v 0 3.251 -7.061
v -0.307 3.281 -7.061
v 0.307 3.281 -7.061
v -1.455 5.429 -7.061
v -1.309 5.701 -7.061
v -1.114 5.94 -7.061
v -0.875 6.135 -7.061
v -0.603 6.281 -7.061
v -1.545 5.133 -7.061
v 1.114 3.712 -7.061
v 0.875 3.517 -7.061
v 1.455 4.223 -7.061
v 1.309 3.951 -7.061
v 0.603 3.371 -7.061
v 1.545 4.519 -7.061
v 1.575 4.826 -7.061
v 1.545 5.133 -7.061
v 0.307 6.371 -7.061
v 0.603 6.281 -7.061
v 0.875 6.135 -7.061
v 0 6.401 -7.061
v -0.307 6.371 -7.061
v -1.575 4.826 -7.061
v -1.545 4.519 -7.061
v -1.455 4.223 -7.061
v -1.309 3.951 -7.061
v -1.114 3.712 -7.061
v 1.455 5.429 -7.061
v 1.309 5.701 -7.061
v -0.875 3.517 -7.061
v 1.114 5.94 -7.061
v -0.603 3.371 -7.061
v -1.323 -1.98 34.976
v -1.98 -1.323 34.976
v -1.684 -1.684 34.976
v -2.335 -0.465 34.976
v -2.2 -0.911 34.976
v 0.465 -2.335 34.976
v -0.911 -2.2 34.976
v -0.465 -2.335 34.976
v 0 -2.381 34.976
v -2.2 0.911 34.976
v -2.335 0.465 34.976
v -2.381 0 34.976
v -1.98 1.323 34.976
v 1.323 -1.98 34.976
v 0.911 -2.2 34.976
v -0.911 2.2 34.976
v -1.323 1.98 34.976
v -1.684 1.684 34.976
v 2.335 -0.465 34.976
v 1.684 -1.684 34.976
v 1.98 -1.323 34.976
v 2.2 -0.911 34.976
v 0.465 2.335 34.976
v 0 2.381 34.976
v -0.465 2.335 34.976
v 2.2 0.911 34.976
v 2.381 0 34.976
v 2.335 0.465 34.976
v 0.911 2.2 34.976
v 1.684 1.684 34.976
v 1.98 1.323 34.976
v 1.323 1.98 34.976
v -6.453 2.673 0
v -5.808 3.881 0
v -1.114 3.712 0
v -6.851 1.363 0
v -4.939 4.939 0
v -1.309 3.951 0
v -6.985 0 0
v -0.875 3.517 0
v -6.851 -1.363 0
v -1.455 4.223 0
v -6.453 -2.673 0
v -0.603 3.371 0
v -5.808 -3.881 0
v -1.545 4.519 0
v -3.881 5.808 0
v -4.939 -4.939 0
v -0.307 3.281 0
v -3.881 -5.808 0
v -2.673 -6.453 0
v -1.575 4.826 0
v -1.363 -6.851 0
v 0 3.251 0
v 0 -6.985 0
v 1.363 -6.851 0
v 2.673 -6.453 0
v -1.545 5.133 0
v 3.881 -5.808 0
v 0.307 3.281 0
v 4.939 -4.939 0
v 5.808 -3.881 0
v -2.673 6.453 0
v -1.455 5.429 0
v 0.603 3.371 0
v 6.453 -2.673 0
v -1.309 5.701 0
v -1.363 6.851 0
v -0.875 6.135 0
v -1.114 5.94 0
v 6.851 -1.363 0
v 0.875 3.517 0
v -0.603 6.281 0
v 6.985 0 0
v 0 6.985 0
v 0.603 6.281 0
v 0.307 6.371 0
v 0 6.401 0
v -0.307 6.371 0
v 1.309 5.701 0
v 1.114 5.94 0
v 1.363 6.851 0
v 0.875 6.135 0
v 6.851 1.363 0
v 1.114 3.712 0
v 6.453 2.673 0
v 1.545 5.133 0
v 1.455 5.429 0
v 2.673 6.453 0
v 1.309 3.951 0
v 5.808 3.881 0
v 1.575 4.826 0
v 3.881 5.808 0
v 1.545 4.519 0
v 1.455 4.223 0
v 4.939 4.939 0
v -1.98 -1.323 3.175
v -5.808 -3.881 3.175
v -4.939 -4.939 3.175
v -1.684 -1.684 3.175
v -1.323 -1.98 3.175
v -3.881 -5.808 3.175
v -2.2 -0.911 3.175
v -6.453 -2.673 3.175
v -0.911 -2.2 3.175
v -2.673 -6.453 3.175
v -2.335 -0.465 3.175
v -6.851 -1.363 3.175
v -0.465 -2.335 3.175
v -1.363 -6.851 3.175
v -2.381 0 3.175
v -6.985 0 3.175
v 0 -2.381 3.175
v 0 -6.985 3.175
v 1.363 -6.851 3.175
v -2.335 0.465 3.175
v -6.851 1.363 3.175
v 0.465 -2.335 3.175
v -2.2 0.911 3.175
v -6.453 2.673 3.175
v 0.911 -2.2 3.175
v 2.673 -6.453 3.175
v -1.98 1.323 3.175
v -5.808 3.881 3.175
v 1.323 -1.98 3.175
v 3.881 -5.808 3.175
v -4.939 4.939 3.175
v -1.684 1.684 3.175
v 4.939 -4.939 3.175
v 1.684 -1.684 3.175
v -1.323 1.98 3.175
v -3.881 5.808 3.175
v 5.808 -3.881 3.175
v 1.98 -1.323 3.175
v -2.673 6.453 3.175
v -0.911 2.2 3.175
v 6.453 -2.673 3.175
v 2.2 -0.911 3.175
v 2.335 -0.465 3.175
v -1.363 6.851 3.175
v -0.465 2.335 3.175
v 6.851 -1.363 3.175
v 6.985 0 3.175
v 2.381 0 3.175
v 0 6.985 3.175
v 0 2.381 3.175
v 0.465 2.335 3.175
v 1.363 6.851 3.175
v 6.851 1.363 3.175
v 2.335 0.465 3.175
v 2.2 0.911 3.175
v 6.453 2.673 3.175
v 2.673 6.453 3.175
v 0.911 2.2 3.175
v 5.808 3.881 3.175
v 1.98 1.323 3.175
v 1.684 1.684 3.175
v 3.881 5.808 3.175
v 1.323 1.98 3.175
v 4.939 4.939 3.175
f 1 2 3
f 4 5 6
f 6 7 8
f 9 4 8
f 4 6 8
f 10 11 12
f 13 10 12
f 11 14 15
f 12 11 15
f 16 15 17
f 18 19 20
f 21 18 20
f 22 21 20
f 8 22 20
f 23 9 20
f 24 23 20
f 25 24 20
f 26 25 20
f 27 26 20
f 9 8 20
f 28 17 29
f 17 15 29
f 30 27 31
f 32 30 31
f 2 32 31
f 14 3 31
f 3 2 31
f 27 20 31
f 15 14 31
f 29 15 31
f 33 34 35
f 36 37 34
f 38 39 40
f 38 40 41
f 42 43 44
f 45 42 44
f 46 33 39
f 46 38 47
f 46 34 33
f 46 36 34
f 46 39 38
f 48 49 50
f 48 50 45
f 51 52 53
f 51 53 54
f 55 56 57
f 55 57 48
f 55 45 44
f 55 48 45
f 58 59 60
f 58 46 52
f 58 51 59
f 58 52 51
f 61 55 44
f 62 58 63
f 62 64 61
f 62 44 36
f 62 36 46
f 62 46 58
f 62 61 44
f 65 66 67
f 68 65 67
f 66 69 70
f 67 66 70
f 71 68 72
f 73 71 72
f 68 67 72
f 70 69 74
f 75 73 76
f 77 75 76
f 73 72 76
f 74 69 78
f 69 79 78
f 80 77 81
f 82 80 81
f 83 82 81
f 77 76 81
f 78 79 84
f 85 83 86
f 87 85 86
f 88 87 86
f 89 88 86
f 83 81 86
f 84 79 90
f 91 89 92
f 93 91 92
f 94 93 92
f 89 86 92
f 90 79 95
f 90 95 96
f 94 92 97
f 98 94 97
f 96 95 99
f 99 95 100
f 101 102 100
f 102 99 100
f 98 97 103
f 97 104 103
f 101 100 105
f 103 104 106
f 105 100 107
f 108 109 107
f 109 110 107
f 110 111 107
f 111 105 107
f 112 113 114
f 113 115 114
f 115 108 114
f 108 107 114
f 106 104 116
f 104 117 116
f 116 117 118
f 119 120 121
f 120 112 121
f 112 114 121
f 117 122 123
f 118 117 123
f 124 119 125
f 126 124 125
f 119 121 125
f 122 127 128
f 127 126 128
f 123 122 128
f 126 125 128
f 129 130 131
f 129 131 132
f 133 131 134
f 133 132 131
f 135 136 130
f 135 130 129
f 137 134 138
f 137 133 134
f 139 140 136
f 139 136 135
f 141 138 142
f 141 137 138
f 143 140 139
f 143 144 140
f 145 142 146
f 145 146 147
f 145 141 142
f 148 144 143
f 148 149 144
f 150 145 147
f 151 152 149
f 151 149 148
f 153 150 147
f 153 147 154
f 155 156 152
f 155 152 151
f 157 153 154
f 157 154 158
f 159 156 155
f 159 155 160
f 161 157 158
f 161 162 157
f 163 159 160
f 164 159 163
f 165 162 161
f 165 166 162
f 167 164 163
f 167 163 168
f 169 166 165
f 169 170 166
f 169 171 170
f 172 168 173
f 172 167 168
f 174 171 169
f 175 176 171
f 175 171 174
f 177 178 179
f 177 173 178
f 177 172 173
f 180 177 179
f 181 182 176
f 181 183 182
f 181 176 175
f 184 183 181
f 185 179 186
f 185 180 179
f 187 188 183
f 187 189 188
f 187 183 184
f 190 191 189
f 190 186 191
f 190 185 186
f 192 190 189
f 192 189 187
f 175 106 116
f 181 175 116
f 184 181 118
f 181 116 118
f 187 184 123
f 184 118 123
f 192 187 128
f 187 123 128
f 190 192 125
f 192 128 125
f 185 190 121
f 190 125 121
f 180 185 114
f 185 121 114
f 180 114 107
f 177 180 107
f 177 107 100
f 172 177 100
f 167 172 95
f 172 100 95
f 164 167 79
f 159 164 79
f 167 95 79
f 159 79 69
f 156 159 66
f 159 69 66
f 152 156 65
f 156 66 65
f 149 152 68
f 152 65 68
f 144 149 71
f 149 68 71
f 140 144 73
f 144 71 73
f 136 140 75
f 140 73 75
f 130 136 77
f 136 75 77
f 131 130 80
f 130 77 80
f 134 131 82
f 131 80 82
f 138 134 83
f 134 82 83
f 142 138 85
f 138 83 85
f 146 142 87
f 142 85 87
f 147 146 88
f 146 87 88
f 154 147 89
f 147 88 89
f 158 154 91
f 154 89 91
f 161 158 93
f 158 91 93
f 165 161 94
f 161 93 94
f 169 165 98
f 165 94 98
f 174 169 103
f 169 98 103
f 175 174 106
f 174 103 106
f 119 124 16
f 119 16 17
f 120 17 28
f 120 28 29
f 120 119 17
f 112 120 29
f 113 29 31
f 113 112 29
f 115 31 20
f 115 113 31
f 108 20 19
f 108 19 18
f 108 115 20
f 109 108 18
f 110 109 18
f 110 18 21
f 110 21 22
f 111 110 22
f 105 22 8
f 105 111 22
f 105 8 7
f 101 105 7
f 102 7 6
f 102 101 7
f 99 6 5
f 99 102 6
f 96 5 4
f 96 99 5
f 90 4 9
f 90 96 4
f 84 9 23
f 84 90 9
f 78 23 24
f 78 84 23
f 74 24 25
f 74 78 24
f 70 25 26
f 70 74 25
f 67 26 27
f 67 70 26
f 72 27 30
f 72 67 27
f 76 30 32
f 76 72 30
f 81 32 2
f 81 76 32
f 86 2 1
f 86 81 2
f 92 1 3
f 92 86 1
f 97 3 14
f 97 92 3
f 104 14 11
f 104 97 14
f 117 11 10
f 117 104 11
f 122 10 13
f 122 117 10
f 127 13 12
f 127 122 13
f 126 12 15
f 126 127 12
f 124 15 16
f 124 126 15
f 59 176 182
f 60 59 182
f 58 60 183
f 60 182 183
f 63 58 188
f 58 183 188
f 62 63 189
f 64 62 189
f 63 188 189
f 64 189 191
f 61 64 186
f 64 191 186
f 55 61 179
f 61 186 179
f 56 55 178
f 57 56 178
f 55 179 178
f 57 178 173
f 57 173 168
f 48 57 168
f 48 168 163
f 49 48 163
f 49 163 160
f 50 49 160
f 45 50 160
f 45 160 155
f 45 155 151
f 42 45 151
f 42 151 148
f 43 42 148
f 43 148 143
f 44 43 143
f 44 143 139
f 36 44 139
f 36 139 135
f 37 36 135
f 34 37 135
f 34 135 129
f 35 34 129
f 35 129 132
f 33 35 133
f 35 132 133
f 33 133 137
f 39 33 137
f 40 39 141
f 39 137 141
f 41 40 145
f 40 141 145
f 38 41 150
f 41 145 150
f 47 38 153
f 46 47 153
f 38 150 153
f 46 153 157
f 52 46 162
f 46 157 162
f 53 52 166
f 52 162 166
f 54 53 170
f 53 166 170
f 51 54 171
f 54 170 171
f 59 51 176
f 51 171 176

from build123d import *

# Parameters (mm, degrees)
F0_R     = 6.985
F0_R_2   = 2.38125
F0_R_3   = 1.5748
F1_DEPTH = 3.175
F2_DEPTH = 34.9758
F3_DEPTH = 7.0612


with BuildPart() as f1:
    # F0 (on Top) → F1 (new body)
    with BuildSketch(Plane.XY):
        Circle(F0_R)
        Circle(F0_R_2, mode=Mode.SUBTRACT)
        with Locations((0, 4.826)):
            Circle(F0_R_3, mode=Mode.SUBTRACT)
        with Locations((0, 4.826)):
            Circle(F0_R_3)
    extrude(amount=F1_DEPTH)

    # F0 (on Top) → F2 (join)
    with BuildSketch(Plane.XY):
        Circle(F0_R_2)
    extrude(amount=F2_DEPTH)

    # F0 (on Top) → F3 (join)
    with BuildSketch(Plane.XY):
        with Locations((0, 4.826)):
            Circle(F0_R_3)
    extrude(amount=-F3_DEPTH)


solid = f1.part
